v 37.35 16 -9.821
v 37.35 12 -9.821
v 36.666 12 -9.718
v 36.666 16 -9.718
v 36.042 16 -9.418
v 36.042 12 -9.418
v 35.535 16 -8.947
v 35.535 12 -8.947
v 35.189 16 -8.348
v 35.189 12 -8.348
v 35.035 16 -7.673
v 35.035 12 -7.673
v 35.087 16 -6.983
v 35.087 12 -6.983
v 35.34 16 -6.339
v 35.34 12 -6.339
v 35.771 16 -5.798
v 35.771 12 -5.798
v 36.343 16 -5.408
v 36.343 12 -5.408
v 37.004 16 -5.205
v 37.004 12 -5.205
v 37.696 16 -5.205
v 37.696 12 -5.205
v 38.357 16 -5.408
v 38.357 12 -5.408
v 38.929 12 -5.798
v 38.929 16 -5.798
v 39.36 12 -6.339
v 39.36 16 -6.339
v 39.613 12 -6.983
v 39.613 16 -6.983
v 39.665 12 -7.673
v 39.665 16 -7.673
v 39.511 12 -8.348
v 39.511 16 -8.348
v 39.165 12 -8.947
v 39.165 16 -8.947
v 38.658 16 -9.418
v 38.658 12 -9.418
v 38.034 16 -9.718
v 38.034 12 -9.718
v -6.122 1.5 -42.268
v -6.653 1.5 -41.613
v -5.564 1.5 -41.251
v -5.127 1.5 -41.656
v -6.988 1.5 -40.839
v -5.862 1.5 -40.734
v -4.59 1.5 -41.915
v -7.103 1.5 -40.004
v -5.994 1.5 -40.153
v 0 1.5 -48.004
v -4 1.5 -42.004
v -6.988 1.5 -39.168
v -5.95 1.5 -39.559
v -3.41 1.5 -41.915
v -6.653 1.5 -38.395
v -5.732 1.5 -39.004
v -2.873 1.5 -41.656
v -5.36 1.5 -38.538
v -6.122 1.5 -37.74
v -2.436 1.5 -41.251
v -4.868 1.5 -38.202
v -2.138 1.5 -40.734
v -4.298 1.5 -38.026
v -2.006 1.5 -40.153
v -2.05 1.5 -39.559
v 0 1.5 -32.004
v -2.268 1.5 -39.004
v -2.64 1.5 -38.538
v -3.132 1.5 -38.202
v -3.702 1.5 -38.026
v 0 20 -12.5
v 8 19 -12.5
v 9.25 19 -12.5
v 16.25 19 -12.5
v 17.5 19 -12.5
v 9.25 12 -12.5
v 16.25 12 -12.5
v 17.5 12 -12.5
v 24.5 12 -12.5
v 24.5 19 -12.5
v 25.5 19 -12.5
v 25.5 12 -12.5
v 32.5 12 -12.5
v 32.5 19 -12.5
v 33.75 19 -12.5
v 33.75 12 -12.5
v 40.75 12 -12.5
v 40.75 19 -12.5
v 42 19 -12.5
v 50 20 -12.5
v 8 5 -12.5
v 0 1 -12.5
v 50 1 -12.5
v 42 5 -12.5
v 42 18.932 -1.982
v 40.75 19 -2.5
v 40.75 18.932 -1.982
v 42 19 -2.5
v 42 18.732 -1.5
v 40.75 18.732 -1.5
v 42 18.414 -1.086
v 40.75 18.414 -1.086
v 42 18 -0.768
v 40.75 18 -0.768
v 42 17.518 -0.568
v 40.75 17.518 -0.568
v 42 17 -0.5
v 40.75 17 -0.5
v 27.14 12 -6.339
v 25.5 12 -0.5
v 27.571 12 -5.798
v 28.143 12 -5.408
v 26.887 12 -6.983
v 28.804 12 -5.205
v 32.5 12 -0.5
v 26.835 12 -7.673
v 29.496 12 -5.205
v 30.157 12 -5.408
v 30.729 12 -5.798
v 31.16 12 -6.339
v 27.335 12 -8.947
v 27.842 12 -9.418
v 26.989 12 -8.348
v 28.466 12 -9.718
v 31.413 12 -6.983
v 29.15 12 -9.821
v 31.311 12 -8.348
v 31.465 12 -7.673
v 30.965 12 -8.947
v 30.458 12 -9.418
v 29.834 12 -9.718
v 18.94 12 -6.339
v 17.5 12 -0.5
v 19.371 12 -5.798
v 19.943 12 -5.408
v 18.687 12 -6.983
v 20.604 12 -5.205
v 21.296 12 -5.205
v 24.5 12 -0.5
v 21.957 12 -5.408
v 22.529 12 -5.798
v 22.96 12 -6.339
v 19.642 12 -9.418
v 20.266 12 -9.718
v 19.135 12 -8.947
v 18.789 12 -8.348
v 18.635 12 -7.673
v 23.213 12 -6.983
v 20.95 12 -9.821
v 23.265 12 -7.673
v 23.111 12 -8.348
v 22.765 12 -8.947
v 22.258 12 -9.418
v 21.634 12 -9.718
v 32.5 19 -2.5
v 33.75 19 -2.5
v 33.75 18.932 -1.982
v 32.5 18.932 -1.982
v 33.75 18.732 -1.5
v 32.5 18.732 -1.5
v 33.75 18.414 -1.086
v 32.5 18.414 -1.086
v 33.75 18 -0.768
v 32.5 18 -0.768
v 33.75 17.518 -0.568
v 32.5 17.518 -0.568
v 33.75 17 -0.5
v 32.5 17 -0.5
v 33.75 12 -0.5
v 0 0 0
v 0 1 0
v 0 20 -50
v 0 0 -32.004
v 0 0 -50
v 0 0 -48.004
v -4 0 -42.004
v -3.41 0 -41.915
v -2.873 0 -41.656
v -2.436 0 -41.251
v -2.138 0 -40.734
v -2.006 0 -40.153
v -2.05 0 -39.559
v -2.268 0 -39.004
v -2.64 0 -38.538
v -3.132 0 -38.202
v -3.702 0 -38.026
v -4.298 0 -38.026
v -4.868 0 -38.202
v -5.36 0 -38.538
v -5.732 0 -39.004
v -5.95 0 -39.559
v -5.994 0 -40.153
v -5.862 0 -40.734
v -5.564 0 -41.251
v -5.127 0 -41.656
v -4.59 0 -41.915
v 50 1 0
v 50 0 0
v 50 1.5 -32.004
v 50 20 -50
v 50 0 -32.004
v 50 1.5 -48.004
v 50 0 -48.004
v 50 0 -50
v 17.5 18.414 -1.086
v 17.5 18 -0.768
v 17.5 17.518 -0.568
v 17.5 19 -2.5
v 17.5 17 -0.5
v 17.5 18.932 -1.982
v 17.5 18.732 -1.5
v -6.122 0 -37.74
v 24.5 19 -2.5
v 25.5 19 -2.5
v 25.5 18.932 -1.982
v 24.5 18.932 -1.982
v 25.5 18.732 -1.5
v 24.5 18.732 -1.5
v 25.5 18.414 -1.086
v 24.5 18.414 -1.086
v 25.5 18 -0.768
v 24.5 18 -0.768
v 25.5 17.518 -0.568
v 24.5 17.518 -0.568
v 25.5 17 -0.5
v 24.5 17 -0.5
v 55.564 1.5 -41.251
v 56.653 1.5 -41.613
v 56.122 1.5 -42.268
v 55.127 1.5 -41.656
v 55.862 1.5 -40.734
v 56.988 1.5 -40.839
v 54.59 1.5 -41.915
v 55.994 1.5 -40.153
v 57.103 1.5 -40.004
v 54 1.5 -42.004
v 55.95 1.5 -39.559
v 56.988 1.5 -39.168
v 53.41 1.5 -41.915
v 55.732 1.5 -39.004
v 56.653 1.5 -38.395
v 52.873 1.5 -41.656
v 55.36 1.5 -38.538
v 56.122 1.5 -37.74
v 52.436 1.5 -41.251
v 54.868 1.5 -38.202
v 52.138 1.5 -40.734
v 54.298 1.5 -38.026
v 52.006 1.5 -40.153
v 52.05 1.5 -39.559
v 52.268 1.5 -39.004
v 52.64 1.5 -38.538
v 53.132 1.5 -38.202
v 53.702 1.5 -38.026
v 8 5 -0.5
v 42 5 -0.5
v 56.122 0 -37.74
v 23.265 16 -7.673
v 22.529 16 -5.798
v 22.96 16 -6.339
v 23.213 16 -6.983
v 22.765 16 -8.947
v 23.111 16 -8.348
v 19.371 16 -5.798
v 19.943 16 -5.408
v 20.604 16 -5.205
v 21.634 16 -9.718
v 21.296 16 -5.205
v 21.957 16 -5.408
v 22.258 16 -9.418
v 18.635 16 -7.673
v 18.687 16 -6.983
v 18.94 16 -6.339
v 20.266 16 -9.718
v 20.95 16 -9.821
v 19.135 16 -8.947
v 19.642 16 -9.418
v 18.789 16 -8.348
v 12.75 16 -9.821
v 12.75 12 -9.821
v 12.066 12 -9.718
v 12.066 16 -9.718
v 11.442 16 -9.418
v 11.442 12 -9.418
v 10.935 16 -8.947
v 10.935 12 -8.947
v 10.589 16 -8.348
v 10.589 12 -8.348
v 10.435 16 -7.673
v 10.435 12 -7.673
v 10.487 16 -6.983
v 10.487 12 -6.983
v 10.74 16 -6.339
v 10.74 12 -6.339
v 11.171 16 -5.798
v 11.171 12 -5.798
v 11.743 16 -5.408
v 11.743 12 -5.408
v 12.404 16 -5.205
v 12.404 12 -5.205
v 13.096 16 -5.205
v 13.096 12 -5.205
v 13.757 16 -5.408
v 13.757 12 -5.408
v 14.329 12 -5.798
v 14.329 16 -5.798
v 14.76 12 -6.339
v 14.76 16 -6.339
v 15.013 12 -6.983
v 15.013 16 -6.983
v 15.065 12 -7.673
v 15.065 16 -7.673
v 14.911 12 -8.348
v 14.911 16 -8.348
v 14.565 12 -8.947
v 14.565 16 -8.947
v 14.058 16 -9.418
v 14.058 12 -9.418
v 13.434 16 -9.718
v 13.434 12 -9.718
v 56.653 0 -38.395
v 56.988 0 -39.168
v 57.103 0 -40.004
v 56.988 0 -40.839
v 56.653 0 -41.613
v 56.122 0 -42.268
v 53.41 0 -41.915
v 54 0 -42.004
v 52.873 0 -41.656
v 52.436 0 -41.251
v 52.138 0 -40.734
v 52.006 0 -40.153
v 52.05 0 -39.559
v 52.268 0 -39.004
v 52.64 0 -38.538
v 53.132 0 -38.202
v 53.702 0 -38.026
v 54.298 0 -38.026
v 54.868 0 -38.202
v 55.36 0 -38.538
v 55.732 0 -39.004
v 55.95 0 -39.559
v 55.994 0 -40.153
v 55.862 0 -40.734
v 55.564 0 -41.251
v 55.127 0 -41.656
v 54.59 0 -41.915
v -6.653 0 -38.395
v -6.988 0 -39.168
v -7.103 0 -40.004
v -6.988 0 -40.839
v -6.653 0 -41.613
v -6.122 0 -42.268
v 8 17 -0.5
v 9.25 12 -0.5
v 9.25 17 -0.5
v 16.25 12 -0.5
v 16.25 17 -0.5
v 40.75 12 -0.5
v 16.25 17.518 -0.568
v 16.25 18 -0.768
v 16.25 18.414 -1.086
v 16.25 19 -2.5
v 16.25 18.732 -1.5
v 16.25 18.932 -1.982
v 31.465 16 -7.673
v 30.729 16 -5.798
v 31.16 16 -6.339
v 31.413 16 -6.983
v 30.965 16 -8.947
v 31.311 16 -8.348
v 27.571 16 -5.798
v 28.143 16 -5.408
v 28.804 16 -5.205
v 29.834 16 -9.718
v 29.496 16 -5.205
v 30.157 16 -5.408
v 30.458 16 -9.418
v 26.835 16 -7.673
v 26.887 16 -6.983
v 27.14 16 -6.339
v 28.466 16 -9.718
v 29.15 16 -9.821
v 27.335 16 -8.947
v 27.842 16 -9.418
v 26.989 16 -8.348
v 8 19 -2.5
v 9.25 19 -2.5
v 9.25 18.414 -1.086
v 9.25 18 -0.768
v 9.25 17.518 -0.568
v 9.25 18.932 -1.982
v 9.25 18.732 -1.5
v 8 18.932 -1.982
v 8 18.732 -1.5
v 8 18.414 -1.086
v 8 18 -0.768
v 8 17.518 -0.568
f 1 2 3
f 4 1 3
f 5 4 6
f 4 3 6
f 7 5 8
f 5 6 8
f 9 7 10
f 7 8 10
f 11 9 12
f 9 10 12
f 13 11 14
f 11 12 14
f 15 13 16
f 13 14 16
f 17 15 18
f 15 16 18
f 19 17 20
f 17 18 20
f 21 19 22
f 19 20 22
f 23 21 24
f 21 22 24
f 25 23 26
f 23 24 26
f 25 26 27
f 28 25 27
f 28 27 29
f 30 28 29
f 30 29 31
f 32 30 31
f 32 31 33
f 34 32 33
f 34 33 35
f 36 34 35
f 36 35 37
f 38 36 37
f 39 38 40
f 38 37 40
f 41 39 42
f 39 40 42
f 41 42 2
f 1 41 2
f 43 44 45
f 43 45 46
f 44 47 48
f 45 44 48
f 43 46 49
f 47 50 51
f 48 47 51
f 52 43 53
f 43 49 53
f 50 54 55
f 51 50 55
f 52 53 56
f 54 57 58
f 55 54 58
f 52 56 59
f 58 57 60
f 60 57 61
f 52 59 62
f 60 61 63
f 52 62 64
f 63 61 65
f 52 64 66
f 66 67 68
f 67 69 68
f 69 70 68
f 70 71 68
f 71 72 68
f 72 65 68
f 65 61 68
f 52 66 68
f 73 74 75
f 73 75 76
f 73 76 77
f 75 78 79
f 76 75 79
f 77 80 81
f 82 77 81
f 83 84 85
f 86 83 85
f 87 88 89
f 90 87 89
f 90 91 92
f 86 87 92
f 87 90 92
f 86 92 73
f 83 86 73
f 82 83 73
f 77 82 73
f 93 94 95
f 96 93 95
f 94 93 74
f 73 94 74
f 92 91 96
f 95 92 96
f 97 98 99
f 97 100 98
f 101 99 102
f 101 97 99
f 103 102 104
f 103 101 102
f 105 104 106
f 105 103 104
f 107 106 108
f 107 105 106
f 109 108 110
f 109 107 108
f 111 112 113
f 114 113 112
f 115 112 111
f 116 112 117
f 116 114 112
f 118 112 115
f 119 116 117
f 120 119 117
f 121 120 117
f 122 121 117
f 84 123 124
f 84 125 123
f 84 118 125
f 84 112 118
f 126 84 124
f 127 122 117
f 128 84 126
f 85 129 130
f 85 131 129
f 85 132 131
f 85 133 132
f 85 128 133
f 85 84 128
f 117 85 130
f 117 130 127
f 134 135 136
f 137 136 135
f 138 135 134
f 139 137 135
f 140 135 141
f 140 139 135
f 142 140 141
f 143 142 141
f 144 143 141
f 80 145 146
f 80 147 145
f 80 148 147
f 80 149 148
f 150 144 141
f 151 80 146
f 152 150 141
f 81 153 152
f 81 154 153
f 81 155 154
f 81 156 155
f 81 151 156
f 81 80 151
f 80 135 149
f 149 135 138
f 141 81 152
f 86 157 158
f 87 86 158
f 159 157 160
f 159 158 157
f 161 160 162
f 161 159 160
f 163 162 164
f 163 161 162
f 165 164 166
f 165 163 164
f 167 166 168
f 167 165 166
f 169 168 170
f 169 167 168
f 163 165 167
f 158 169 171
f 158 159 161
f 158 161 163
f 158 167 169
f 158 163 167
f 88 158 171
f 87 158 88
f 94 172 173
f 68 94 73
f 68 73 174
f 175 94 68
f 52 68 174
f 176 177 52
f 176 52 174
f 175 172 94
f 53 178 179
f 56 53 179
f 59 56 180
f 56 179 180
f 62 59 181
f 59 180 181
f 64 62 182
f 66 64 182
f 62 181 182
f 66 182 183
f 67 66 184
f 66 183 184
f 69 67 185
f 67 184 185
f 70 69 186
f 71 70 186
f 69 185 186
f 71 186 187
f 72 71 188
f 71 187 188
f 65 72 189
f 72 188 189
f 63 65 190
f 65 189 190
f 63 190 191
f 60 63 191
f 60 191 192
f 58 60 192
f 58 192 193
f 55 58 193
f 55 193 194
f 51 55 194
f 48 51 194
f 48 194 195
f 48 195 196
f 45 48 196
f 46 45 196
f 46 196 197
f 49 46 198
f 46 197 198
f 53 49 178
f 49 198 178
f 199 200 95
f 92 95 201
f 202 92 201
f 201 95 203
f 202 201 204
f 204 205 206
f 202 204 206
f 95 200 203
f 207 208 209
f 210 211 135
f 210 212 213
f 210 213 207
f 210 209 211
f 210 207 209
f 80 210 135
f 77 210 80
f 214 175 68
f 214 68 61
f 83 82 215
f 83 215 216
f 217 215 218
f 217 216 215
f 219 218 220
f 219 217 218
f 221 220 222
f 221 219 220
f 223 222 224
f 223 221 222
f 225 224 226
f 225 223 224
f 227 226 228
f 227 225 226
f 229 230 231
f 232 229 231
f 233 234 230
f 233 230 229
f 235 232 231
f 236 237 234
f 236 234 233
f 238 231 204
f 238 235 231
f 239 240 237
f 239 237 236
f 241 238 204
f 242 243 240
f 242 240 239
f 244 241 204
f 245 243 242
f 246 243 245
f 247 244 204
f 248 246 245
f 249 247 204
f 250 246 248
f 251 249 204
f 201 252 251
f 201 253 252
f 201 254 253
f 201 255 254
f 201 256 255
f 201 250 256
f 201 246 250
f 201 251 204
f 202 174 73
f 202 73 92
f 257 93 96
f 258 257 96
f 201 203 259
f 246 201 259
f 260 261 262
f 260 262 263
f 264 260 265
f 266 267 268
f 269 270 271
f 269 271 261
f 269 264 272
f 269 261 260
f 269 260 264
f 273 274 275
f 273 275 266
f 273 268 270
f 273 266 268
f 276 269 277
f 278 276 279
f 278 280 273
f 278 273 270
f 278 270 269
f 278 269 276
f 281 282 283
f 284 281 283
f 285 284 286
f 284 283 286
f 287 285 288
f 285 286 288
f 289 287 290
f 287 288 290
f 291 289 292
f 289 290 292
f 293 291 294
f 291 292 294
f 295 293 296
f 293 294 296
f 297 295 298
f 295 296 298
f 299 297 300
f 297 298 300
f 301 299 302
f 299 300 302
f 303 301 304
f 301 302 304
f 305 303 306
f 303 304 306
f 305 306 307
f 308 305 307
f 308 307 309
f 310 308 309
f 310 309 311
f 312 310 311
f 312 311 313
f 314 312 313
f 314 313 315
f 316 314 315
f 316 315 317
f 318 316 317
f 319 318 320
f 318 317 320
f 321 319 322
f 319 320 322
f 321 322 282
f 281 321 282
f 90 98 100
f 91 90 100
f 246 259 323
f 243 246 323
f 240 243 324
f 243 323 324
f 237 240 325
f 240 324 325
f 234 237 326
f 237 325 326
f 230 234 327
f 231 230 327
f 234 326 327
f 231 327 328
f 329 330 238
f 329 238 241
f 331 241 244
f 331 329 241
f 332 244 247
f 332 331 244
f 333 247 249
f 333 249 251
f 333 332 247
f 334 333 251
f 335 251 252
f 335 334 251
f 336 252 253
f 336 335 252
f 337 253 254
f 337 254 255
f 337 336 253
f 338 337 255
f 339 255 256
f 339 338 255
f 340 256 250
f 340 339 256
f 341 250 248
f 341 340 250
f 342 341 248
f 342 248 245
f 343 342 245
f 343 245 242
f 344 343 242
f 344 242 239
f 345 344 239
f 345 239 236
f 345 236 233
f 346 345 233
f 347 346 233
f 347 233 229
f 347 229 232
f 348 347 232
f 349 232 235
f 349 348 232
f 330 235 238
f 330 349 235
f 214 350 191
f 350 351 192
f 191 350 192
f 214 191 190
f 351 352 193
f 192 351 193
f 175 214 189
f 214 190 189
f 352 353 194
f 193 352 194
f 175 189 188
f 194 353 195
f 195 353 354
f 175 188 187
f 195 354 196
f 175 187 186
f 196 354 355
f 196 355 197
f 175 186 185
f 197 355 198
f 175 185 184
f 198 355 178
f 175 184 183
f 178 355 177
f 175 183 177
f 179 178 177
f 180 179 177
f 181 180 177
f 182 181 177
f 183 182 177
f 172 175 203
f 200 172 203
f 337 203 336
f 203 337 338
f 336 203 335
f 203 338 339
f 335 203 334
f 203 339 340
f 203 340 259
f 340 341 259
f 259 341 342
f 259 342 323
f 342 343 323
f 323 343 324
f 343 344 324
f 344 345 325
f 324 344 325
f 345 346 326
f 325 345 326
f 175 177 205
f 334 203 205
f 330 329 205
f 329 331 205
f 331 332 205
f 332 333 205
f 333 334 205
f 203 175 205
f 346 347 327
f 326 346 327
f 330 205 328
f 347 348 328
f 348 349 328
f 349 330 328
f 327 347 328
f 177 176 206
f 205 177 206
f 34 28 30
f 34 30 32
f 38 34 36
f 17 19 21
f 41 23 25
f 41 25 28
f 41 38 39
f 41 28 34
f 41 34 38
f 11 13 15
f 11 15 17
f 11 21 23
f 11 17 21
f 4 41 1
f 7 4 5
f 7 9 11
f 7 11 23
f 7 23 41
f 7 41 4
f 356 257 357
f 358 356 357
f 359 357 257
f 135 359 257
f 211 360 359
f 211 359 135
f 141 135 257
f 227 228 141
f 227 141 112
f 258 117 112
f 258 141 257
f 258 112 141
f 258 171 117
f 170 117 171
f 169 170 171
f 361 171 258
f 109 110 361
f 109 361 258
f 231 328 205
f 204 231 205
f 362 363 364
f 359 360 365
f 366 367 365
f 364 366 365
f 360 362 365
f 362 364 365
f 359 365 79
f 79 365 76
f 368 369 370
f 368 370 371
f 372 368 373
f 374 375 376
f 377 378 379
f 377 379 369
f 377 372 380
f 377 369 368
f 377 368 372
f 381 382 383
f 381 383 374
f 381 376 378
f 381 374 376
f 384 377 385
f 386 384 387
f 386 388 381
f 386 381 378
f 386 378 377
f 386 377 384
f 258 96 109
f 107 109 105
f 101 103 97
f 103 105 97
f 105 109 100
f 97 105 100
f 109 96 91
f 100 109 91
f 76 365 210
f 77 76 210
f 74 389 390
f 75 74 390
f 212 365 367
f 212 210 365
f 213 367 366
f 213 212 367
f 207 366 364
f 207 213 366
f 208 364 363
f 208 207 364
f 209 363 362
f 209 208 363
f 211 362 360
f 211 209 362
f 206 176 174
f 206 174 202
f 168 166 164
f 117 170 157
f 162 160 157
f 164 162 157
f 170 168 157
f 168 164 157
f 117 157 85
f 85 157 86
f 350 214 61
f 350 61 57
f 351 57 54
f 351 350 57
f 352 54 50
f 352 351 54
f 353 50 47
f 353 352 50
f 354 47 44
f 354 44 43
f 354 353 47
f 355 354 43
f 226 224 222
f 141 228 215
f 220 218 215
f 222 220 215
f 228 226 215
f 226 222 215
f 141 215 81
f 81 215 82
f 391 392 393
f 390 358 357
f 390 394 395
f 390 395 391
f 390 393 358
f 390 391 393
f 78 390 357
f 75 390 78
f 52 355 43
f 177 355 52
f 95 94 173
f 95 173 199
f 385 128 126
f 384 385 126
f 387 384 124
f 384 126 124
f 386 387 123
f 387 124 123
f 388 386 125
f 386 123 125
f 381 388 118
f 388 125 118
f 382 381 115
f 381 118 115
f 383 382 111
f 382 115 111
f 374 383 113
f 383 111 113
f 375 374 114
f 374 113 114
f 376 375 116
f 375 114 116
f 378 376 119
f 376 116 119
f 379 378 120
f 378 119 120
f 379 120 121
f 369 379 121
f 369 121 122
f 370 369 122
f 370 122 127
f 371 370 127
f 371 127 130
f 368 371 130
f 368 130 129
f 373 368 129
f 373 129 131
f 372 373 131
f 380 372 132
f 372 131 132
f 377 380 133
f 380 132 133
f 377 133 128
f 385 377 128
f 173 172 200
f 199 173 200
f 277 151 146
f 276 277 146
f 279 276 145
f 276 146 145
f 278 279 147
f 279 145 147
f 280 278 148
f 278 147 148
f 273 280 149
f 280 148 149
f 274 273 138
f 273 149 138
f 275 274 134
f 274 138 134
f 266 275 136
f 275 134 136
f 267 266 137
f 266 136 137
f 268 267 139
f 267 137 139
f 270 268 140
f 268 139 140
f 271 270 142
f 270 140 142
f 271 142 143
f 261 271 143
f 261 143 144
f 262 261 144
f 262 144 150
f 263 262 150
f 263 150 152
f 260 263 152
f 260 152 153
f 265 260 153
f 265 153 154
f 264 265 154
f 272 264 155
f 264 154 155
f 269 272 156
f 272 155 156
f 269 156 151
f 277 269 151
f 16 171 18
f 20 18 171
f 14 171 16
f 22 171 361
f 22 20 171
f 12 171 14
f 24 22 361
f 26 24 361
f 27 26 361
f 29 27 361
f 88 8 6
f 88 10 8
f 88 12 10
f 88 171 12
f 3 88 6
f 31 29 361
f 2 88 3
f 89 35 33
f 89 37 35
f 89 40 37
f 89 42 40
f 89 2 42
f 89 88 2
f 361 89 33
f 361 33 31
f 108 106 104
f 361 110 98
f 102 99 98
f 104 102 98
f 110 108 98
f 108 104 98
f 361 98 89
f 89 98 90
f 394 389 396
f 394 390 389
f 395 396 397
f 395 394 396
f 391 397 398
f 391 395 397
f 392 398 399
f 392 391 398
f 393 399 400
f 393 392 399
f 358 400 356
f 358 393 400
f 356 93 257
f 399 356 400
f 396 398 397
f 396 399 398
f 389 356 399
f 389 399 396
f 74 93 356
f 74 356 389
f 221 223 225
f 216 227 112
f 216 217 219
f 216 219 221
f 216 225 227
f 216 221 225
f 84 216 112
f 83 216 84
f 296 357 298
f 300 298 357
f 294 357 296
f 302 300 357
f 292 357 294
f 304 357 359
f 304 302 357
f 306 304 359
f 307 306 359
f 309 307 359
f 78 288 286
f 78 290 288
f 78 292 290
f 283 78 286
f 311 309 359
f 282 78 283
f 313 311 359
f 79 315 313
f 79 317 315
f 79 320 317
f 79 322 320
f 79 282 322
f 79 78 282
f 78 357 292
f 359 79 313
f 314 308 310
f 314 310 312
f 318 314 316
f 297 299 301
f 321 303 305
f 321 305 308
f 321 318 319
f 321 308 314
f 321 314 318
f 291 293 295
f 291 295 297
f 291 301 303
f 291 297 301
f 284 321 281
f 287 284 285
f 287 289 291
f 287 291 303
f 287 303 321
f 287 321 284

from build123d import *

# Parameters (mm, degrees)
SKETCH1_W           = 50
SKETCH1_H           = 50
BOSS_EXTRUDE1_DEPTH = 1
SKETCH2_W           = 50
SKETCH2_H           = 37.5
BOSS_EXTRUDE2_DEPTH = 19
SKETCH3_W           = 34
SKETCH3_H           = 14
BOSS_EXTRUDE3_DEPTH = 12
SKETCH4_R           = 2
BOSS_EXTRUDE4_DEPTH = 1.5
SKETCH5_W           = 7
SKETCH5_H           = 12
CUT_EXTRUDE1_DEPTH  = 7
FILLET1_R           = 2
SKETCH6_R           = 2.32139267
BOSS_EXTRUDE5_DEPTH = 4
LPATTERN1_COUNT     = 4
LPATTERN1_PITCH     = 8.2


with BuildPart() as part:
    # Sketch1 → Boss-Extrude1 (new body)
    with BuildSketch(Plane(origin=(0, 0, 0), x_dir=(1, 0, 0), z_dir=(0, 1, 0))):
        with Locations((25, 25)):
            Rectangle(SKETCH1_W, SKETCH1_H)
    extrude(amount=BOSS_EXTRUDE1_DEPTH)

    # Sketch2 → Boss-Extrude2 (add)
    with BuildSketch(Plane(origin=(0, 1, 0), x_dir=(1, 0, 0), z_dir=(0, 1, 0))):
        with Locations((25, 31.25)):
            Rectangle(SKETCH2_W, SKETCH2_H)
    extrude(amount=BOSS_EXTRUDE2_DEPTH)

    # Sketch3 → Boss-Extrude3 (add)
    with BuildSketch(Plane.XY.offset(-12.5)):
        with Locations((25, 12)):
            Rectangle(SKETCH3_W, SKETCH3_H)
    extrude(amount=BOSS_EXTRUDE3_DEPTH)

    # Sketch4 → Boss-Extrude4 (add)
    with BuildSketch(Plane.XZ):
        with BuildLine():
            Line((0, -32.003753373), (-6.121503896, -37.739612135))
            ThreePointArc((-6.121503896, -37.739612135), (-7.102759148, -40.003753373), (-6.121503896, -42.267894612))
            Line((-6.121503896, -42.267894612), (0, -48.003753373))
            Line((0, -48.003753373), (0, -32.003753373))
        make_face()
        with Locations(Location((-4, -40.003753373, 0), (0, 0, 270))):
            Circle(SKETCH4_R, mode=Mode.SUBTRACT)
    boss_extrude4 = extrude(amount=-BOSS_EXTRUDE4_DEPTH)

    # Mirror1: Boss-Extrude4 across plane
    add(boss_extrude4.mirror(Plane.ZY.offset(-25)))

    # Sketch5 → Cut-Extrude1 (cut)
    with BuildSketch(Plane(origin=(0, 19, 0), x_dir=(1, 0, 0), z_dir=(0, 1, 0))):
        with Locations((21, 6.5)):
            Rectangle(SKETCH5_W, SKETCH5_H)
        with Locations((29, 6.5)):
            Rectangle(SKETCH5_W, SKETCH5_H)
        with Locations((37.25, 6.5)):
            Rectangle(SKETCH5_W, SKETCH5_H)
        with Locations((12.75, 6.5)):
            Rectangle(SKETCH5_W, SKETCH5_H)
    extrude(amount=-CUT_EXTRUDE1_DEPTH, mode=Mode.SUBTRACT)

    # Fillet1
    fillet1_edges = [part.edges().sort_by_distance(p)[0] for p in [
        (41.375, 19, -0.5),
        (33.125, 19, -0.5),
        (25, 19, -0.5),
        (16.875, 19, -0.5),
        (8.625, 19, -0.5),
    ]]
    fillet(fillet1_edges, radius=FILLET1_R)

    # Sketch6 → Boss-Extrude5 (add)
    with BuildSketch(Plane(origin=(0, 12, 0), x_dir=(1, 0, 0), z_dir=(0, 1, 0))):
        with Locations(Location((12.75, 7.5, 0), (0, 0, 90))):
            Circle(SKETCH6_R)
    boss_extrude5 = extrude(amount=BOSS_EXTRUDE5_DEPTH)

    # LPattern1: Boss-Extrude5 ×4
    with Locations(*[(i * LPATTERN1_PITCH, 0, 0) for i in range(1, LPATTERN1_COUNT)]):
        add(boss_extrude5)


solid = part.part
